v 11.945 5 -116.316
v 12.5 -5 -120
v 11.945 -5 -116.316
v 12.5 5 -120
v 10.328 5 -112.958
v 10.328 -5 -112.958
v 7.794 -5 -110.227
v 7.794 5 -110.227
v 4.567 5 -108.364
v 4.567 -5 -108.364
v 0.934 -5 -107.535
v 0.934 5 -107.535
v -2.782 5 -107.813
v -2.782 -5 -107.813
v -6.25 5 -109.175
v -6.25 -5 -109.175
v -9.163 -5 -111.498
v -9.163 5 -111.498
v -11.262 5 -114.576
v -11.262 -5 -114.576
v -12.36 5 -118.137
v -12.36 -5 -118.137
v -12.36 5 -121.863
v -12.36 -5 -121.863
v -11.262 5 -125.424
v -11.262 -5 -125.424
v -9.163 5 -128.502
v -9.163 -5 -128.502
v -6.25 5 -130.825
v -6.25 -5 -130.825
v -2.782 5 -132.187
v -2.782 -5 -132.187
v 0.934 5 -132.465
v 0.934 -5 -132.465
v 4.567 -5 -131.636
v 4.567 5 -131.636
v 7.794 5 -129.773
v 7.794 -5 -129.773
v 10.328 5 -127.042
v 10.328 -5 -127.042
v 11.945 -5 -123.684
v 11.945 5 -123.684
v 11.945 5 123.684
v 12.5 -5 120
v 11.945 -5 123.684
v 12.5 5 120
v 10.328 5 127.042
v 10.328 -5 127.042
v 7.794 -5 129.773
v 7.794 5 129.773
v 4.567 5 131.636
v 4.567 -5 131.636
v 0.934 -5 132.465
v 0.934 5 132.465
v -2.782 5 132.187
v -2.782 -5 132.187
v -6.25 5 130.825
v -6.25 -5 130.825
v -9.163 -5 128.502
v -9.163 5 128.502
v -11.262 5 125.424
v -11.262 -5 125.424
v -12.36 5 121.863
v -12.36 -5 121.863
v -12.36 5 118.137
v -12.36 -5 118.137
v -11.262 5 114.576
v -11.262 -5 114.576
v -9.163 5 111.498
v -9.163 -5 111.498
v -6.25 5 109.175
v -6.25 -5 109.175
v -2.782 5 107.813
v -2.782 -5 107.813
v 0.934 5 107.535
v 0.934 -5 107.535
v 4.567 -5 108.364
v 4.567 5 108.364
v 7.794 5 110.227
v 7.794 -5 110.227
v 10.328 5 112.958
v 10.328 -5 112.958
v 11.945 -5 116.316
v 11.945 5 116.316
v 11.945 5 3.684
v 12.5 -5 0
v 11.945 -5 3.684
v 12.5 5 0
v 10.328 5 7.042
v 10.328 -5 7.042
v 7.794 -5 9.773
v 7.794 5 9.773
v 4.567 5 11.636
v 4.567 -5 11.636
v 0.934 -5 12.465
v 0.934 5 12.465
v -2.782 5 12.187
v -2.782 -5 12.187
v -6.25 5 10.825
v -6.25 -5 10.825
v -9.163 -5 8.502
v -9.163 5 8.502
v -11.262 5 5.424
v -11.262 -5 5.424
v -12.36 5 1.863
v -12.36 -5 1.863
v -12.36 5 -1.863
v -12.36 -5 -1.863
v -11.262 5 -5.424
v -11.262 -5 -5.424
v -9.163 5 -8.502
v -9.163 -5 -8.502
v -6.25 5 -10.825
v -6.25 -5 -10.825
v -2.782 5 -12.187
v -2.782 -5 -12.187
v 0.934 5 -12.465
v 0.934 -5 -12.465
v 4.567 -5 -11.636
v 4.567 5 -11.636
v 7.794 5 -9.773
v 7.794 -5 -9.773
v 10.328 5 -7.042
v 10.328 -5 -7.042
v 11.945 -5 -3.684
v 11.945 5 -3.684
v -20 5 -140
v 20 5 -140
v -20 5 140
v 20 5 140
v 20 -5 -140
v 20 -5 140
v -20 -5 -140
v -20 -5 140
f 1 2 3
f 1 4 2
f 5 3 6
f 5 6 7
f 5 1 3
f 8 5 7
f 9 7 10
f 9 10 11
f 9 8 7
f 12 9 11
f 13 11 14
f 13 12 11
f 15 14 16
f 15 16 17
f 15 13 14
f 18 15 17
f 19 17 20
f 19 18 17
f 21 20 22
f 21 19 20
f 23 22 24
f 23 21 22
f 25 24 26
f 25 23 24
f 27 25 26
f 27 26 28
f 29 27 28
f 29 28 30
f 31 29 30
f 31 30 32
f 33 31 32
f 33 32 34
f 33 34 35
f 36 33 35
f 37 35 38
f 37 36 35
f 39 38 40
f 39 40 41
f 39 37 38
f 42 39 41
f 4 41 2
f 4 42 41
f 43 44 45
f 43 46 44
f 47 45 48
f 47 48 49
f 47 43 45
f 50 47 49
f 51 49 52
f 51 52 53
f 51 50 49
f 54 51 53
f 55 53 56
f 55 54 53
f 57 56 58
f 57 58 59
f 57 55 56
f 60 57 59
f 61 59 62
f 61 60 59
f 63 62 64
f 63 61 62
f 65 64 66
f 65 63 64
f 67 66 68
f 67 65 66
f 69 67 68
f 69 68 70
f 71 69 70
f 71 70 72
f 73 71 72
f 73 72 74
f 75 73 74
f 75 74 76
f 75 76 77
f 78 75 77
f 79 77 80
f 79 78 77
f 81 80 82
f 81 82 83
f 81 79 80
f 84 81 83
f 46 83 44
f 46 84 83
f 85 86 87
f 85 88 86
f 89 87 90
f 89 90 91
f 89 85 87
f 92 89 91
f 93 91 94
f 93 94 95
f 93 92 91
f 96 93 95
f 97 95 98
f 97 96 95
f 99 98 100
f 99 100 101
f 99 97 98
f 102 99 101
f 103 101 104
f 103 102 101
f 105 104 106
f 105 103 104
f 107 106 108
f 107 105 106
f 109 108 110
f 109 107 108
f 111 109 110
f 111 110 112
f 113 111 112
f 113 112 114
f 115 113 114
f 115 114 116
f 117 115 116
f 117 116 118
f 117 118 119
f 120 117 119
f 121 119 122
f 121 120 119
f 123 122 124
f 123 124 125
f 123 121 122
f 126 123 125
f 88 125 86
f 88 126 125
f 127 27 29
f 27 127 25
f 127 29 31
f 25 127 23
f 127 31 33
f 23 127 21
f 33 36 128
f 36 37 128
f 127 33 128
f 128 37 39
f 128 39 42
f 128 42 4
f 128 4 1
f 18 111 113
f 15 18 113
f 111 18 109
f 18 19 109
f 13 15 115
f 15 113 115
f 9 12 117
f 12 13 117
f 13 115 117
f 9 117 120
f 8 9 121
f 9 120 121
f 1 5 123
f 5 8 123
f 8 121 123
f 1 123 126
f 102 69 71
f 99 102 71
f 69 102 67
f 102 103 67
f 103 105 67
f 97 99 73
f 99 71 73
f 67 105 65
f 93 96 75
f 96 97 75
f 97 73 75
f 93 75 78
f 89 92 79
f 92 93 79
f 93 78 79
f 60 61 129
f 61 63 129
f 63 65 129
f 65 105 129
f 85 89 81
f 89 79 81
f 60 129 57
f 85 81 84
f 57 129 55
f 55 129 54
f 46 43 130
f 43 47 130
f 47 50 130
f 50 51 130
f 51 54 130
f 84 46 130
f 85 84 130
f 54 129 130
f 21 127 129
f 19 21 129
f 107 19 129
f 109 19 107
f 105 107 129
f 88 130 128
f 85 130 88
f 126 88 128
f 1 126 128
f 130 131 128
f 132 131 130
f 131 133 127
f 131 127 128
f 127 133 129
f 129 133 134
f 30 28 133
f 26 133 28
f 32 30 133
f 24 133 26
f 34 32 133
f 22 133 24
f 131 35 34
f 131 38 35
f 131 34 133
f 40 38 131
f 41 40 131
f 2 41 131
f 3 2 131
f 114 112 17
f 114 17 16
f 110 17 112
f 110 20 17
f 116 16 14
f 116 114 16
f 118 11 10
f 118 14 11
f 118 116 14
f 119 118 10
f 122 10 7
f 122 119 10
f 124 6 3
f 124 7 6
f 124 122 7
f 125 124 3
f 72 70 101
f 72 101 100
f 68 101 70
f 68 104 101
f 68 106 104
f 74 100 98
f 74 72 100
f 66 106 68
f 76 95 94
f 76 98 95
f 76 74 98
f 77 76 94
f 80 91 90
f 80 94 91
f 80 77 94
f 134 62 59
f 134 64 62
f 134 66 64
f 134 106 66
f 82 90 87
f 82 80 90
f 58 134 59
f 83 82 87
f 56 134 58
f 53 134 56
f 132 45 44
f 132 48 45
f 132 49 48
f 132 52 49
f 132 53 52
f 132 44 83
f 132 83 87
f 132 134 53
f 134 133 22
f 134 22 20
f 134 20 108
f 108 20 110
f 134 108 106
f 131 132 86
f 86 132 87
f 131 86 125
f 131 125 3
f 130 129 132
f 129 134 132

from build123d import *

# Parameters (mm, degrees)
F0_W     = 40
F0_H     = 280
F0_R     = 12.5
F1_DEPTH = 5


with BuildPart() as f1:
    # F0 (on Front) → F1 (new body, symmetric)
    with BuildSketch(Plane.XZ):
        Rectangle(F0_W, F0_H)
        with Locations((0, -120)):
            Circle(F0_R, mode=Mode.SUBTRACT)
        Circle(F0_R, mode=Mode.SUBTRACT)
        with Locations((0, 120)):
            Circle(F0_R, mode=Mode.SUBTRACT)
    extrude(amount=F1_DEPTH, both=True)


solid = f1.part
